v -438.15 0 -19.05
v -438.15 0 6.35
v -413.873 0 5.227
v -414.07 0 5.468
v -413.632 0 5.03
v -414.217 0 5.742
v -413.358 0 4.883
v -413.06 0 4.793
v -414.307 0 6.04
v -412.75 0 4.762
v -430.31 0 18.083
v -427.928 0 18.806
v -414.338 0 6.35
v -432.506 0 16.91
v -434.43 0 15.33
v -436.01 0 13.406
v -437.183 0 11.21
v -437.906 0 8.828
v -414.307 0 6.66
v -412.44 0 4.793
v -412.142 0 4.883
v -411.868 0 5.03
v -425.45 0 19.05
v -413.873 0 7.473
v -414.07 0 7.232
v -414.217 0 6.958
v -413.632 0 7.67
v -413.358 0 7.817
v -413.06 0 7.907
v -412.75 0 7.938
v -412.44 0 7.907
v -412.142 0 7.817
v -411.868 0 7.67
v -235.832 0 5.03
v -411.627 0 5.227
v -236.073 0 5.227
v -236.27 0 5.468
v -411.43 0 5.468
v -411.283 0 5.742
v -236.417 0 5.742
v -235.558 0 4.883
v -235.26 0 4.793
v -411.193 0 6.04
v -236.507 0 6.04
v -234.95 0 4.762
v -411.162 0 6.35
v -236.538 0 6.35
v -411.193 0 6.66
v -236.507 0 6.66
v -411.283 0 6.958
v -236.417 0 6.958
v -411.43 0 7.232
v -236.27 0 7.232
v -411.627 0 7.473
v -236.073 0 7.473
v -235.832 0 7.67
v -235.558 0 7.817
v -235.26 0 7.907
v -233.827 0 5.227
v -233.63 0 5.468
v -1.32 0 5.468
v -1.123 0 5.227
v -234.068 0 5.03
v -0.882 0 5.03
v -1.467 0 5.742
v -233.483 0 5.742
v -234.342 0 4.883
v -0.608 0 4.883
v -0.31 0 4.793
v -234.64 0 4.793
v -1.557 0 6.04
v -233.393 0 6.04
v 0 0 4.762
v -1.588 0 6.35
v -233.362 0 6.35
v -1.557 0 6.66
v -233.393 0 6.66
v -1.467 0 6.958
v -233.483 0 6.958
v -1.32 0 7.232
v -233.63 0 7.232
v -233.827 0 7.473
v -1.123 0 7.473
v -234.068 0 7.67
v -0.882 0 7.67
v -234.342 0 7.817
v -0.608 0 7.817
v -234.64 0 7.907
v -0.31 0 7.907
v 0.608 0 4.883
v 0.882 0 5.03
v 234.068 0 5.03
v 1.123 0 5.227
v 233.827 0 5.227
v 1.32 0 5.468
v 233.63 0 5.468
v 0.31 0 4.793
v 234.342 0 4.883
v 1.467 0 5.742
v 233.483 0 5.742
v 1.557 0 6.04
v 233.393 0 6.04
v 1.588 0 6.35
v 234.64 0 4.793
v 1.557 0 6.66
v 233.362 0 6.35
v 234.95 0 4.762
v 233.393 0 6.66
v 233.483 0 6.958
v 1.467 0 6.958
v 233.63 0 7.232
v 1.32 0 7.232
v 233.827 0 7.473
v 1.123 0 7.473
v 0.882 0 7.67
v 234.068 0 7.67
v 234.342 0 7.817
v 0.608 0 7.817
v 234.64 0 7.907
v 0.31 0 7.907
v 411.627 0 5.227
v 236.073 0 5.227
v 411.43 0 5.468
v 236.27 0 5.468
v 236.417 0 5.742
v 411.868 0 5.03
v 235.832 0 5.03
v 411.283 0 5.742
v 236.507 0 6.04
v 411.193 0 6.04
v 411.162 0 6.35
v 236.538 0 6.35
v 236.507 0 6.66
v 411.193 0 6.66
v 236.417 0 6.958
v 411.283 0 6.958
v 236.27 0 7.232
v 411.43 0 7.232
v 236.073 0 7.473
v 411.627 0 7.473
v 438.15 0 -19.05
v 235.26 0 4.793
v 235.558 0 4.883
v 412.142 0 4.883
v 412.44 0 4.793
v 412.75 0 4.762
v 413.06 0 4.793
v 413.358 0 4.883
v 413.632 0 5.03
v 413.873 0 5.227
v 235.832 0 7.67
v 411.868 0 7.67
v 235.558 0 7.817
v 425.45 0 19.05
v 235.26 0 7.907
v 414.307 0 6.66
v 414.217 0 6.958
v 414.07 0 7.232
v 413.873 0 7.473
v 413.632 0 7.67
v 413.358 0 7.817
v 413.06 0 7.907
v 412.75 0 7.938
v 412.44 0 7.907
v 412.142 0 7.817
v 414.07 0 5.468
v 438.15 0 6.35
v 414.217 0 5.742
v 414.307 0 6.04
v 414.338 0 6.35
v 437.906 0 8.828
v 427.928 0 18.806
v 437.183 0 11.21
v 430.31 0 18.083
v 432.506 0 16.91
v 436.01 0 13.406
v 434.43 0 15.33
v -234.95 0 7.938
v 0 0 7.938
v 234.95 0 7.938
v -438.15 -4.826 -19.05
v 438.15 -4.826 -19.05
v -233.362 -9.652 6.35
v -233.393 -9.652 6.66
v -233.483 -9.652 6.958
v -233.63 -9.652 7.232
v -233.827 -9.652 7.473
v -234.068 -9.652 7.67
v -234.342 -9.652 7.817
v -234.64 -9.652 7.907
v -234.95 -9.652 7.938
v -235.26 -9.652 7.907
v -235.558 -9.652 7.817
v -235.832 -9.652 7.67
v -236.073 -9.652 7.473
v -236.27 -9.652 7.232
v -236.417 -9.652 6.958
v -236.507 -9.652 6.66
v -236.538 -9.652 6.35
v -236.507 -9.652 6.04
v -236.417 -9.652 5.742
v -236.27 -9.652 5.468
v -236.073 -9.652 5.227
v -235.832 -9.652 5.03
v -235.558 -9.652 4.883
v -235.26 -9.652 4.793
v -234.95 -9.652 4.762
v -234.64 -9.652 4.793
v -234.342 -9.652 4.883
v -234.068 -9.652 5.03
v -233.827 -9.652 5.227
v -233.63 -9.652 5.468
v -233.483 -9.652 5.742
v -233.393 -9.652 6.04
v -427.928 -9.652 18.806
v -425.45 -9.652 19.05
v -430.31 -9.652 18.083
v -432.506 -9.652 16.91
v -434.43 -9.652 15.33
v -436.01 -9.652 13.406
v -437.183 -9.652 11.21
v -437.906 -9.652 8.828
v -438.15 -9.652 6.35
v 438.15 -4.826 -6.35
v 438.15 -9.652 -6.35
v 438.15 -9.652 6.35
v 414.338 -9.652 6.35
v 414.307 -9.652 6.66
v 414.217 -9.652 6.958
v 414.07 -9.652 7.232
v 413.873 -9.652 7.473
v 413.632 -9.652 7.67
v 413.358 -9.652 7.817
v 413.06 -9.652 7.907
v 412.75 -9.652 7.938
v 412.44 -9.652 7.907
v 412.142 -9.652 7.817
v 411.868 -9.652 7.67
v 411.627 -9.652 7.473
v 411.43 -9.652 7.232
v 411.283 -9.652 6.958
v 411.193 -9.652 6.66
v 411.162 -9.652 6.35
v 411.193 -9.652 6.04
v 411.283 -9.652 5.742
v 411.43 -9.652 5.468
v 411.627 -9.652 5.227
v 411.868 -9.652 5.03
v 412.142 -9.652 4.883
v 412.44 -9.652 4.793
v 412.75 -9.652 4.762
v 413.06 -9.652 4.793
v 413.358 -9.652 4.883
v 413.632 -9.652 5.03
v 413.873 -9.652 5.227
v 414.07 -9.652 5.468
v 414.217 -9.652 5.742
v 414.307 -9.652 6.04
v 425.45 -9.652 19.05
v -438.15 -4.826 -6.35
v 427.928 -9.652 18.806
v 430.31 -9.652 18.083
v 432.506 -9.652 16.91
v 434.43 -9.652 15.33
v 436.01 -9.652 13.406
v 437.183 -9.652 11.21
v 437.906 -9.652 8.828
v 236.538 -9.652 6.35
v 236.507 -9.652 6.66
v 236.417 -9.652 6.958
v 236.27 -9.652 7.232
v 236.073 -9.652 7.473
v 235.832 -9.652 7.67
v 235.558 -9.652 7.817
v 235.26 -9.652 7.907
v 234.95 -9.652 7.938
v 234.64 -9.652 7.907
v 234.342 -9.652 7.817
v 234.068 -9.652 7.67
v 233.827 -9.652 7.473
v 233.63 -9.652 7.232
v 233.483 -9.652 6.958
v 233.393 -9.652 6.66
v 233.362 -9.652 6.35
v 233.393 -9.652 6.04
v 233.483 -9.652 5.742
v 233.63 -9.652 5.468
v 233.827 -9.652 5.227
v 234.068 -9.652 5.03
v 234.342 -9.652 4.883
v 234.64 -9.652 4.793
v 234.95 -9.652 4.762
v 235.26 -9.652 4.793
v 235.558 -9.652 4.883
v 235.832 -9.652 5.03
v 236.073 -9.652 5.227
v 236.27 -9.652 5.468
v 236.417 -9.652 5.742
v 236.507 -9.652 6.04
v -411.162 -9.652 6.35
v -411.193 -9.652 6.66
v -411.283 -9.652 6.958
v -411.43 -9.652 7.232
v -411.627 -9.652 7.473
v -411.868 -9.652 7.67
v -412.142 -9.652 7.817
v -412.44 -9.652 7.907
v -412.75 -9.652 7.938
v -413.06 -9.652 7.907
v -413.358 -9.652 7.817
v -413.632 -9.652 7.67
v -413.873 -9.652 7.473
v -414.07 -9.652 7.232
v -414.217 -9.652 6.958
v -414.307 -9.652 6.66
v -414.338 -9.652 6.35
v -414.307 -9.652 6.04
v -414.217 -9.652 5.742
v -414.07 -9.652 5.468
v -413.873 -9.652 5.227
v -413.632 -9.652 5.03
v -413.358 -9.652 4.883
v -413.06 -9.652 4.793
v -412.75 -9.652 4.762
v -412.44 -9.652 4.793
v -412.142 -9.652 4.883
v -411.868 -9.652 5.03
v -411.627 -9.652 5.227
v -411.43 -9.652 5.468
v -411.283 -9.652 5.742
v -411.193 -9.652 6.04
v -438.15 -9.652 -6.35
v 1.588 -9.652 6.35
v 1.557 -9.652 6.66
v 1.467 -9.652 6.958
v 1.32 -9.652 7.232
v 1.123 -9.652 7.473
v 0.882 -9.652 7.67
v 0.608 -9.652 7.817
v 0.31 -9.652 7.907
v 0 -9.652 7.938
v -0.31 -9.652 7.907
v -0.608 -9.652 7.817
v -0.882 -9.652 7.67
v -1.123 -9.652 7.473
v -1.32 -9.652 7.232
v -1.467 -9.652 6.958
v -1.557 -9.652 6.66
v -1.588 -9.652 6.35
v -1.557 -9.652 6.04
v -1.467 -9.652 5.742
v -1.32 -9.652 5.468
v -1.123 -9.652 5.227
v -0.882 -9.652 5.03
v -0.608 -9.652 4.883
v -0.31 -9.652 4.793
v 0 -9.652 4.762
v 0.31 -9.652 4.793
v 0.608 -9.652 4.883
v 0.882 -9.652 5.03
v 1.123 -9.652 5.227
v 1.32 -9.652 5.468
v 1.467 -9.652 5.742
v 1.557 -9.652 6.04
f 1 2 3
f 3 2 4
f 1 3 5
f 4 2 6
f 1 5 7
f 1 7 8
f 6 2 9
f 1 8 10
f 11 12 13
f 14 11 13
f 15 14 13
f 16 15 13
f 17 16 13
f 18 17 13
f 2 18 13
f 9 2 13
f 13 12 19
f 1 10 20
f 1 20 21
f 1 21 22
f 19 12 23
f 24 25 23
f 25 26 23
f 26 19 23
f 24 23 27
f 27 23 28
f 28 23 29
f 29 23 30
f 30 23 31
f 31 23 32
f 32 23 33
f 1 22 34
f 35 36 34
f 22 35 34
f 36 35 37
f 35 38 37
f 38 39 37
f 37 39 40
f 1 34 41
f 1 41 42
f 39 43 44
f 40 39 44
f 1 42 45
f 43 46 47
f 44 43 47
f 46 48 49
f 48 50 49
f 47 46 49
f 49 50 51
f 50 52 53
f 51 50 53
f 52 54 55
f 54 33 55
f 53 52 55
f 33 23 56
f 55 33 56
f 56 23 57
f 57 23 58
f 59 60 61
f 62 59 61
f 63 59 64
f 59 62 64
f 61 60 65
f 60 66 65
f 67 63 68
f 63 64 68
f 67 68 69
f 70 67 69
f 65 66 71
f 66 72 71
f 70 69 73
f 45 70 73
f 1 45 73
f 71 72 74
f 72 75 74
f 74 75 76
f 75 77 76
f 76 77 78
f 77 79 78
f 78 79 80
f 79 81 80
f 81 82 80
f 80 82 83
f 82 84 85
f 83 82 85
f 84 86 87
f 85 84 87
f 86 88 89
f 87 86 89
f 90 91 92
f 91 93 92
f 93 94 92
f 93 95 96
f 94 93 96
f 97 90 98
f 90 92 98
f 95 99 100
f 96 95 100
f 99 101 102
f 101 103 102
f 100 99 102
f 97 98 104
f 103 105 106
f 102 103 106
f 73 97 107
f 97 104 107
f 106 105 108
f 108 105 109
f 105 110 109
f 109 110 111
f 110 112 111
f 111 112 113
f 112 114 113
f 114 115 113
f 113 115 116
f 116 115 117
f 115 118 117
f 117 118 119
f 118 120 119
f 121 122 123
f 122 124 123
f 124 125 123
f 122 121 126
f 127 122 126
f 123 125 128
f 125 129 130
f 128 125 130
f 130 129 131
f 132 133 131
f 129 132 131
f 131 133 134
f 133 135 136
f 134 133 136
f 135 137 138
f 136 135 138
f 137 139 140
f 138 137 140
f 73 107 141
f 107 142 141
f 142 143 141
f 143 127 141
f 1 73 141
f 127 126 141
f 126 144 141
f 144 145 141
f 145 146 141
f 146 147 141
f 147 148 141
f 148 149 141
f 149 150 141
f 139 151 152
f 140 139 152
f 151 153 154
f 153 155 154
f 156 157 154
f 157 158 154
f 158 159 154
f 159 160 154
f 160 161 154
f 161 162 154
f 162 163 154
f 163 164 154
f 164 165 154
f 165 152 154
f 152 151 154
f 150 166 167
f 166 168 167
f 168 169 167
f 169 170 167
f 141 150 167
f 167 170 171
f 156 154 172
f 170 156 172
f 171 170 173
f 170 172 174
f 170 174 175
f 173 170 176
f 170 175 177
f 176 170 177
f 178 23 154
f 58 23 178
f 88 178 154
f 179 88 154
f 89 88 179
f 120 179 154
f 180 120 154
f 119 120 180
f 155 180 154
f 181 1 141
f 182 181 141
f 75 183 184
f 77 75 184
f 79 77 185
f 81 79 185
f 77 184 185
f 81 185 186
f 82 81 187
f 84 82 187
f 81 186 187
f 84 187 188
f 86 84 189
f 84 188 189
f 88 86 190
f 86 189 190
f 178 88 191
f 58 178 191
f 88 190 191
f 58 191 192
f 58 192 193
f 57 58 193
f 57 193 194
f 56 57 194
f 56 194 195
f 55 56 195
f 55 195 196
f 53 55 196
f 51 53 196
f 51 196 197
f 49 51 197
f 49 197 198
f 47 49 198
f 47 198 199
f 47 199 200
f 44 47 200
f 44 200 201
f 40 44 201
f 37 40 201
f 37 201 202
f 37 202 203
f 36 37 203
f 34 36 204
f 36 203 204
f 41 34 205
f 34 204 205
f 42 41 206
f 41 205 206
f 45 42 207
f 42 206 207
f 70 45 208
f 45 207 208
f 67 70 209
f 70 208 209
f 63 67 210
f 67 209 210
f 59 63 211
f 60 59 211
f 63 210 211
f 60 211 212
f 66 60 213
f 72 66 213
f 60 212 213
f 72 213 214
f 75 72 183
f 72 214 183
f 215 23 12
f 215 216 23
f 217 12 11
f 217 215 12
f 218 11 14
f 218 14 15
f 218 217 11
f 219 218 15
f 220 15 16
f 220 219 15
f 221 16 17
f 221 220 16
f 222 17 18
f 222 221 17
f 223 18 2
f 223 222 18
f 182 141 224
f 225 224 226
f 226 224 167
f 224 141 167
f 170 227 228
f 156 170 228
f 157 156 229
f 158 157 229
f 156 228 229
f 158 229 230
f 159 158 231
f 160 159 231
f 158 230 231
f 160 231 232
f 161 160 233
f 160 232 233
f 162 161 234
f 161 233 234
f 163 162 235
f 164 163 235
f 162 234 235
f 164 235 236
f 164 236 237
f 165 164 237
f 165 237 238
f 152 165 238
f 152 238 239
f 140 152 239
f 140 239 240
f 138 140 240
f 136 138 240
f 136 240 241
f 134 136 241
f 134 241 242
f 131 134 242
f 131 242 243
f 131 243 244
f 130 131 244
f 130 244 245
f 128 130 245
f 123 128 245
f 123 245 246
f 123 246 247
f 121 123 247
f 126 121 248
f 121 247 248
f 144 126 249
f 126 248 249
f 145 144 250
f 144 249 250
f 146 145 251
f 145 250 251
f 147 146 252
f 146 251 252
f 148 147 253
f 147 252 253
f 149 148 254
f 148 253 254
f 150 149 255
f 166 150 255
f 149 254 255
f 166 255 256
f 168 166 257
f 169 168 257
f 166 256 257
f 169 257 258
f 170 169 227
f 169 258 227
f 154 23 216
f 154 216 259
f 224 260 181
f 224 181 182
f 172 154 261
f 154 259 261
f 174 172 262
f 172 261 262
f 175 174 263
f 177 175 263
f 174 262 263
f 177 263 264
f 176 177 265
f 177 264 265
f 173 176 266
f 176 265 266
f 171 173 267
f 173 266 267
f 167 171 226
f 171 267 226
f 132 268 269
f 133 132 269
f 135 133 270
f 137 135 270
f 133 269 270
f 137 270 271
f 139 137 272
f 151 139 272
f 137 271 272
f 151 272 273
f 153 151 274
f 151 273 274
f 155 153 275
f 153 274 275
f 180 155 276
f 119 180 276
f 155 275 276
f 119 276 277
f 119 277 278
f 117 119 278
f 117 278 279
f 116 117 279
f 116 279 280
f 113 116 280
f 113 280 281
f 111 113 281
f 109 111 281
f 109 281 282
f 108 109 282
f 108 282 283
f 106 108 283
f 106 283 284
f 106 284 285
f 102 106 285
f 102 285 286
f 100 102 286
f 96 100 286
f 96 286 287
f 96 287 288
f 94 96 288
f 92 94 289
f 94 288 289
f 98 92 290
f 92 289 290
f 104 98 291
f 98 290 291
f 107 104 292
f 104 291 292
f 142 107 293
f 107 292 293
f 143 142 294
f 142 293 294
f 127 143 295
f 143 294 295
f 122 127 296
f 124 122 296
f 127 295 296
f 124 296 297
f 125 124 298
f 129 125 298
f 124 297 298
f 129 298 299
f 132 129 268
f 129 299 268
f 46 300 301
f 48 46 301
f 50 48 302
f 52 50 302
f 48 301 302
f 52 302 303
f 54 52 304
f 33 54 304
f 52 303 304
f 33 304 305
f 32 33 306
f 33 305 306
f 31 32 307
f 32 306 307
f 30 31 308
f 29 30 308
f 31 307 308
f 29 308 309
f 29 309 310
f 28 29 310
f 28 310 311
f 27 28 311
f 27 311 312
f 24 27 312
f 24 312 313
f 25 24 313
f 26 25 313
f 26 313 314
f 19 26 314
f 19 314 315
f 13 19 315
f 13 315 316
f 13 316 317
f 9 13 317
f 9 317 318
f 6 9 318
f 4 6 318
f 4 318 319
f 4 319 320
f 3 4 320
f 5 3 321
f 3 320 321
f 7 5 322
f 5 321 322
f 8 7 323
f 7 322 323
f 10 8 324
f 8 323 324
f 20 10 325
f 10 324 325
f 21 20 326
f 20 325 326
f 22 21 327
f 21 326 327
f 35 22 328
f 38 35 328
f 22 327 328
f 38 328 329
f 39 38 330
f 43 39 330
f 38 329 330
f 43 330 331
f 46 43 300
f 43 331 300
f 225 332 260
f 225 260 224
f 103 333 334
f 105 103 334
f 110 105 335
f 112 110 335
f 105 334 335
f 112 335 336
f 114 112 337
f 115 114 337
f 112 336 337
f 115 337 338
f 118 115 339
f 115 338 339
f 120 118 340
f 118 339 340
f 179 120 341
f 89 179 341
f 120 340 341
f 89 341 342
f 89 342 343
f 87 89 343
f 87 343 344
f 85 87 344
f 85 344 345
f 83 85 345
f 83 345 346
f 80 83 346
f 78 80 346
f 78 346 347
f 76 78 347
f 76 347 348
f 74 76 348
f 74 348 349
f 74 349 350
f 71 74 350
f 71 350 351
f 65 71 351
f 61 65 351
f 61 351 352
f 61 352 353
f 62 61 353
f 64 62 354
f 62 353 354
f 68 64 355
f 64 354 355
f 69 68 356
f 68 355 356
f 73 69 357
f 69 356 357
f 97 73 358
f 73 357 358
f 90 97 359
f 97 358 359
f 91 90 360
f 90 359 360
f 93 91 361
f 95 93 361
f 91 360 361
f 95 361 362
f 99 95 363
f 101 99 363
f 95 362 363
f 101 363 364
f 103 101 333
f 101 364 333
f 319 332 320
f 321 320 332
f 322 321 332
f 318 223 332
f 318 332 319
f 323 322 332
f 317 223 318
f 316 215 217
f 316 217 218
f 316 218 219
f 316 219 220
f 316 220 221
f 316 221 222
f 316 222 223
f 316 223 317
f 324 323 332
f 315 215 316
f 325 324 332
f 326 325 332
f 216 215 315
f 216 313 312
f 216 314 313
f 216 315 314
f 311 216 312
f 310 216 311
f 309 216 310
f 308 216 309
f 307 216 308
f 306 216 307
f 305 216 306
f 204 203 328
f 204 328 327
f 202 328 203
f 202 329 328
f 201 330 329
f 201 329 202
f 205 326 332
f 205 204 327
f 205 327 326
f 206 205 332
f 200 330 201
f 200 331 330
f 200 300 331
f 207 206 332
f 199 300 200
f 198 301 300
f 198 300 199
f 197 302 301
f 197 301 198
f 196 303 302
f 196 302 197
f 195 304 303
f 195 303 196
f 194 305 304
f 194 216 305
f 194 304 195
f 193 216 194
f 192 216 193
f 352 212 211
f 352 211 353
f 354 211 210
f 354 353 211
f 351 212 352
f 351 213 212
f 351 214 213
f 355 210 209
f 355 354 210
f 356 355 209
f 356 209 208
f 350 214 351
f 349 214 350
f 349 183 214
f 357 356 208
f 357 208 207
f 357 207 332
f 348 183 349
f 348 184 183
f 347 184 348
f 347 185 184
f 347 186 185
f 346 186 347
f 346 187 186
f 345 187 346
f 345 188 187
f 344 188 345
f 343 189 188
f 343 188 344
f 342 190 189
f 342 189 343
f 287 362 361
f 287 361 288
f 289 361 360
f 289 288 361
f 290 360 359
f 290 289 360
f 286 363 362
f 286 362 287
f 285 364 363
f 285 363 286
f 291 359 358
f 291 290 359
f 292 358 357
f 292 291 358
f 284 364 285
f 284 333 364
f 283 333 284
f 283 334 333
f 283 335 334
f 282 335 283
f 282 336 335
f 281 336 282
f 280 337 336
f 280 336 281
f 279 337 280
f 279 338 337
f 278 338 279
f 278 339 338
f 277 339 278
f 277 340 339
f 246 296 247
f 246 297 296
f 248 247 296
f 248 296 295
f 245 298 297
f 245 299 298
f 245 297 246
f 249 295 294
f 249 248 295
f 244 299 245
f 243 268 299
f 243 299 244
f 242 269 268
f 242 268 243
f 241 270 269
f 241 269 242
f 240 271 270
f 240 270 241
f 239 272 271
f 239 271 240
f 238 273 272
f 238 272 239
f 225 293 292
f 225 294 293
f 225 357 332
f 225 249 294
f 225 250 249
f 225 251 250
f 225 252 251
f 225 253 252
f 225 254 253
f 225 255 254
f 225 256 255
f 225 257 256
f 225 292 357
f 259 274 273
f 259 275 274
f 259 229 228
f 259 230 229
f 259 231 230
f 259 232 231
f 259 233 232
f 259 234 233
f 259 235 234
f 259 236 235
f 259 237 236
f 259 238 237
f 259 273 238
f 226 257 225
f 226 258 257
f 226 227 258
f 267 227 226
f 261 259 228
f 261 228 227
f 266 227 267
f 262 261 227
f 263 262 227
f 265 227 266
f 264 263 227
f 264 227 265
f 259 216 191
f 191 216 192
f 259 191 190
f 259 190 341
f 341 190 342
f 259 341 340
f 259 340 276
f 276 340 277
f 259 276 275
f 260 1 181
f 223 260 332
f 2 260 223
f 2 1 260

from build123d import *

# Parameters (mm, degrees)
F0_W     = 876.3
F0_H     = 38.1
F1_DEPTH = 9.652
F3_D     = 3.175
F3_DEPTH = 9.652
F4_R     = 12.7
F5_R     = 12.7
F6_W     = 876.3
F6_H     = 12.7
F7_DEPTH = 4.826


with BuildPart() as f1:
    # F0 (on Front) → F1 (new body)
    with BuildSketch(Plane.XZ):
        Rectangle(F0_W, F0_H)
    extrude(amount=F1_DEPTH)

    # F3
    with Locations(Plane(origin=(0, 0, 0), x_dir=(-1, 0, 0), z_dir=(0, 1, 0))):
        with Locations((-412.75, 6.35), (-234.95, 6.35), (0, 6.35), (234.95, 6.35), (412.75, 6.35)):
            Hole(F3_D / 2, depth=F3_DEPTH)

    # F4
    f4_edges = [f1.edges().sort_by_distance(p)[0] for p in [
        (438.15, -4.826, 19.05),
    ]]
    fillet(f4_edges, radius=F4_R)

    # F5
    f5_edges = [f1.edges().sort_by_distance(p)[0] for p in [
        (-438.15, -4.826, 19.05),
    ]]
    fillet(f5_edges, radius=F5_R)

    # F6 (on face) → F7 (cut)
    with BuildSketch(Plane.XZ.offset(9.652)):
        with Locations((0, -12.7)):
            Rectangle(F6_W, F6_H)
    extrude(amount=-F7_DEPTH, mode=Mode.SUBTRACT)


solid = f1.part
